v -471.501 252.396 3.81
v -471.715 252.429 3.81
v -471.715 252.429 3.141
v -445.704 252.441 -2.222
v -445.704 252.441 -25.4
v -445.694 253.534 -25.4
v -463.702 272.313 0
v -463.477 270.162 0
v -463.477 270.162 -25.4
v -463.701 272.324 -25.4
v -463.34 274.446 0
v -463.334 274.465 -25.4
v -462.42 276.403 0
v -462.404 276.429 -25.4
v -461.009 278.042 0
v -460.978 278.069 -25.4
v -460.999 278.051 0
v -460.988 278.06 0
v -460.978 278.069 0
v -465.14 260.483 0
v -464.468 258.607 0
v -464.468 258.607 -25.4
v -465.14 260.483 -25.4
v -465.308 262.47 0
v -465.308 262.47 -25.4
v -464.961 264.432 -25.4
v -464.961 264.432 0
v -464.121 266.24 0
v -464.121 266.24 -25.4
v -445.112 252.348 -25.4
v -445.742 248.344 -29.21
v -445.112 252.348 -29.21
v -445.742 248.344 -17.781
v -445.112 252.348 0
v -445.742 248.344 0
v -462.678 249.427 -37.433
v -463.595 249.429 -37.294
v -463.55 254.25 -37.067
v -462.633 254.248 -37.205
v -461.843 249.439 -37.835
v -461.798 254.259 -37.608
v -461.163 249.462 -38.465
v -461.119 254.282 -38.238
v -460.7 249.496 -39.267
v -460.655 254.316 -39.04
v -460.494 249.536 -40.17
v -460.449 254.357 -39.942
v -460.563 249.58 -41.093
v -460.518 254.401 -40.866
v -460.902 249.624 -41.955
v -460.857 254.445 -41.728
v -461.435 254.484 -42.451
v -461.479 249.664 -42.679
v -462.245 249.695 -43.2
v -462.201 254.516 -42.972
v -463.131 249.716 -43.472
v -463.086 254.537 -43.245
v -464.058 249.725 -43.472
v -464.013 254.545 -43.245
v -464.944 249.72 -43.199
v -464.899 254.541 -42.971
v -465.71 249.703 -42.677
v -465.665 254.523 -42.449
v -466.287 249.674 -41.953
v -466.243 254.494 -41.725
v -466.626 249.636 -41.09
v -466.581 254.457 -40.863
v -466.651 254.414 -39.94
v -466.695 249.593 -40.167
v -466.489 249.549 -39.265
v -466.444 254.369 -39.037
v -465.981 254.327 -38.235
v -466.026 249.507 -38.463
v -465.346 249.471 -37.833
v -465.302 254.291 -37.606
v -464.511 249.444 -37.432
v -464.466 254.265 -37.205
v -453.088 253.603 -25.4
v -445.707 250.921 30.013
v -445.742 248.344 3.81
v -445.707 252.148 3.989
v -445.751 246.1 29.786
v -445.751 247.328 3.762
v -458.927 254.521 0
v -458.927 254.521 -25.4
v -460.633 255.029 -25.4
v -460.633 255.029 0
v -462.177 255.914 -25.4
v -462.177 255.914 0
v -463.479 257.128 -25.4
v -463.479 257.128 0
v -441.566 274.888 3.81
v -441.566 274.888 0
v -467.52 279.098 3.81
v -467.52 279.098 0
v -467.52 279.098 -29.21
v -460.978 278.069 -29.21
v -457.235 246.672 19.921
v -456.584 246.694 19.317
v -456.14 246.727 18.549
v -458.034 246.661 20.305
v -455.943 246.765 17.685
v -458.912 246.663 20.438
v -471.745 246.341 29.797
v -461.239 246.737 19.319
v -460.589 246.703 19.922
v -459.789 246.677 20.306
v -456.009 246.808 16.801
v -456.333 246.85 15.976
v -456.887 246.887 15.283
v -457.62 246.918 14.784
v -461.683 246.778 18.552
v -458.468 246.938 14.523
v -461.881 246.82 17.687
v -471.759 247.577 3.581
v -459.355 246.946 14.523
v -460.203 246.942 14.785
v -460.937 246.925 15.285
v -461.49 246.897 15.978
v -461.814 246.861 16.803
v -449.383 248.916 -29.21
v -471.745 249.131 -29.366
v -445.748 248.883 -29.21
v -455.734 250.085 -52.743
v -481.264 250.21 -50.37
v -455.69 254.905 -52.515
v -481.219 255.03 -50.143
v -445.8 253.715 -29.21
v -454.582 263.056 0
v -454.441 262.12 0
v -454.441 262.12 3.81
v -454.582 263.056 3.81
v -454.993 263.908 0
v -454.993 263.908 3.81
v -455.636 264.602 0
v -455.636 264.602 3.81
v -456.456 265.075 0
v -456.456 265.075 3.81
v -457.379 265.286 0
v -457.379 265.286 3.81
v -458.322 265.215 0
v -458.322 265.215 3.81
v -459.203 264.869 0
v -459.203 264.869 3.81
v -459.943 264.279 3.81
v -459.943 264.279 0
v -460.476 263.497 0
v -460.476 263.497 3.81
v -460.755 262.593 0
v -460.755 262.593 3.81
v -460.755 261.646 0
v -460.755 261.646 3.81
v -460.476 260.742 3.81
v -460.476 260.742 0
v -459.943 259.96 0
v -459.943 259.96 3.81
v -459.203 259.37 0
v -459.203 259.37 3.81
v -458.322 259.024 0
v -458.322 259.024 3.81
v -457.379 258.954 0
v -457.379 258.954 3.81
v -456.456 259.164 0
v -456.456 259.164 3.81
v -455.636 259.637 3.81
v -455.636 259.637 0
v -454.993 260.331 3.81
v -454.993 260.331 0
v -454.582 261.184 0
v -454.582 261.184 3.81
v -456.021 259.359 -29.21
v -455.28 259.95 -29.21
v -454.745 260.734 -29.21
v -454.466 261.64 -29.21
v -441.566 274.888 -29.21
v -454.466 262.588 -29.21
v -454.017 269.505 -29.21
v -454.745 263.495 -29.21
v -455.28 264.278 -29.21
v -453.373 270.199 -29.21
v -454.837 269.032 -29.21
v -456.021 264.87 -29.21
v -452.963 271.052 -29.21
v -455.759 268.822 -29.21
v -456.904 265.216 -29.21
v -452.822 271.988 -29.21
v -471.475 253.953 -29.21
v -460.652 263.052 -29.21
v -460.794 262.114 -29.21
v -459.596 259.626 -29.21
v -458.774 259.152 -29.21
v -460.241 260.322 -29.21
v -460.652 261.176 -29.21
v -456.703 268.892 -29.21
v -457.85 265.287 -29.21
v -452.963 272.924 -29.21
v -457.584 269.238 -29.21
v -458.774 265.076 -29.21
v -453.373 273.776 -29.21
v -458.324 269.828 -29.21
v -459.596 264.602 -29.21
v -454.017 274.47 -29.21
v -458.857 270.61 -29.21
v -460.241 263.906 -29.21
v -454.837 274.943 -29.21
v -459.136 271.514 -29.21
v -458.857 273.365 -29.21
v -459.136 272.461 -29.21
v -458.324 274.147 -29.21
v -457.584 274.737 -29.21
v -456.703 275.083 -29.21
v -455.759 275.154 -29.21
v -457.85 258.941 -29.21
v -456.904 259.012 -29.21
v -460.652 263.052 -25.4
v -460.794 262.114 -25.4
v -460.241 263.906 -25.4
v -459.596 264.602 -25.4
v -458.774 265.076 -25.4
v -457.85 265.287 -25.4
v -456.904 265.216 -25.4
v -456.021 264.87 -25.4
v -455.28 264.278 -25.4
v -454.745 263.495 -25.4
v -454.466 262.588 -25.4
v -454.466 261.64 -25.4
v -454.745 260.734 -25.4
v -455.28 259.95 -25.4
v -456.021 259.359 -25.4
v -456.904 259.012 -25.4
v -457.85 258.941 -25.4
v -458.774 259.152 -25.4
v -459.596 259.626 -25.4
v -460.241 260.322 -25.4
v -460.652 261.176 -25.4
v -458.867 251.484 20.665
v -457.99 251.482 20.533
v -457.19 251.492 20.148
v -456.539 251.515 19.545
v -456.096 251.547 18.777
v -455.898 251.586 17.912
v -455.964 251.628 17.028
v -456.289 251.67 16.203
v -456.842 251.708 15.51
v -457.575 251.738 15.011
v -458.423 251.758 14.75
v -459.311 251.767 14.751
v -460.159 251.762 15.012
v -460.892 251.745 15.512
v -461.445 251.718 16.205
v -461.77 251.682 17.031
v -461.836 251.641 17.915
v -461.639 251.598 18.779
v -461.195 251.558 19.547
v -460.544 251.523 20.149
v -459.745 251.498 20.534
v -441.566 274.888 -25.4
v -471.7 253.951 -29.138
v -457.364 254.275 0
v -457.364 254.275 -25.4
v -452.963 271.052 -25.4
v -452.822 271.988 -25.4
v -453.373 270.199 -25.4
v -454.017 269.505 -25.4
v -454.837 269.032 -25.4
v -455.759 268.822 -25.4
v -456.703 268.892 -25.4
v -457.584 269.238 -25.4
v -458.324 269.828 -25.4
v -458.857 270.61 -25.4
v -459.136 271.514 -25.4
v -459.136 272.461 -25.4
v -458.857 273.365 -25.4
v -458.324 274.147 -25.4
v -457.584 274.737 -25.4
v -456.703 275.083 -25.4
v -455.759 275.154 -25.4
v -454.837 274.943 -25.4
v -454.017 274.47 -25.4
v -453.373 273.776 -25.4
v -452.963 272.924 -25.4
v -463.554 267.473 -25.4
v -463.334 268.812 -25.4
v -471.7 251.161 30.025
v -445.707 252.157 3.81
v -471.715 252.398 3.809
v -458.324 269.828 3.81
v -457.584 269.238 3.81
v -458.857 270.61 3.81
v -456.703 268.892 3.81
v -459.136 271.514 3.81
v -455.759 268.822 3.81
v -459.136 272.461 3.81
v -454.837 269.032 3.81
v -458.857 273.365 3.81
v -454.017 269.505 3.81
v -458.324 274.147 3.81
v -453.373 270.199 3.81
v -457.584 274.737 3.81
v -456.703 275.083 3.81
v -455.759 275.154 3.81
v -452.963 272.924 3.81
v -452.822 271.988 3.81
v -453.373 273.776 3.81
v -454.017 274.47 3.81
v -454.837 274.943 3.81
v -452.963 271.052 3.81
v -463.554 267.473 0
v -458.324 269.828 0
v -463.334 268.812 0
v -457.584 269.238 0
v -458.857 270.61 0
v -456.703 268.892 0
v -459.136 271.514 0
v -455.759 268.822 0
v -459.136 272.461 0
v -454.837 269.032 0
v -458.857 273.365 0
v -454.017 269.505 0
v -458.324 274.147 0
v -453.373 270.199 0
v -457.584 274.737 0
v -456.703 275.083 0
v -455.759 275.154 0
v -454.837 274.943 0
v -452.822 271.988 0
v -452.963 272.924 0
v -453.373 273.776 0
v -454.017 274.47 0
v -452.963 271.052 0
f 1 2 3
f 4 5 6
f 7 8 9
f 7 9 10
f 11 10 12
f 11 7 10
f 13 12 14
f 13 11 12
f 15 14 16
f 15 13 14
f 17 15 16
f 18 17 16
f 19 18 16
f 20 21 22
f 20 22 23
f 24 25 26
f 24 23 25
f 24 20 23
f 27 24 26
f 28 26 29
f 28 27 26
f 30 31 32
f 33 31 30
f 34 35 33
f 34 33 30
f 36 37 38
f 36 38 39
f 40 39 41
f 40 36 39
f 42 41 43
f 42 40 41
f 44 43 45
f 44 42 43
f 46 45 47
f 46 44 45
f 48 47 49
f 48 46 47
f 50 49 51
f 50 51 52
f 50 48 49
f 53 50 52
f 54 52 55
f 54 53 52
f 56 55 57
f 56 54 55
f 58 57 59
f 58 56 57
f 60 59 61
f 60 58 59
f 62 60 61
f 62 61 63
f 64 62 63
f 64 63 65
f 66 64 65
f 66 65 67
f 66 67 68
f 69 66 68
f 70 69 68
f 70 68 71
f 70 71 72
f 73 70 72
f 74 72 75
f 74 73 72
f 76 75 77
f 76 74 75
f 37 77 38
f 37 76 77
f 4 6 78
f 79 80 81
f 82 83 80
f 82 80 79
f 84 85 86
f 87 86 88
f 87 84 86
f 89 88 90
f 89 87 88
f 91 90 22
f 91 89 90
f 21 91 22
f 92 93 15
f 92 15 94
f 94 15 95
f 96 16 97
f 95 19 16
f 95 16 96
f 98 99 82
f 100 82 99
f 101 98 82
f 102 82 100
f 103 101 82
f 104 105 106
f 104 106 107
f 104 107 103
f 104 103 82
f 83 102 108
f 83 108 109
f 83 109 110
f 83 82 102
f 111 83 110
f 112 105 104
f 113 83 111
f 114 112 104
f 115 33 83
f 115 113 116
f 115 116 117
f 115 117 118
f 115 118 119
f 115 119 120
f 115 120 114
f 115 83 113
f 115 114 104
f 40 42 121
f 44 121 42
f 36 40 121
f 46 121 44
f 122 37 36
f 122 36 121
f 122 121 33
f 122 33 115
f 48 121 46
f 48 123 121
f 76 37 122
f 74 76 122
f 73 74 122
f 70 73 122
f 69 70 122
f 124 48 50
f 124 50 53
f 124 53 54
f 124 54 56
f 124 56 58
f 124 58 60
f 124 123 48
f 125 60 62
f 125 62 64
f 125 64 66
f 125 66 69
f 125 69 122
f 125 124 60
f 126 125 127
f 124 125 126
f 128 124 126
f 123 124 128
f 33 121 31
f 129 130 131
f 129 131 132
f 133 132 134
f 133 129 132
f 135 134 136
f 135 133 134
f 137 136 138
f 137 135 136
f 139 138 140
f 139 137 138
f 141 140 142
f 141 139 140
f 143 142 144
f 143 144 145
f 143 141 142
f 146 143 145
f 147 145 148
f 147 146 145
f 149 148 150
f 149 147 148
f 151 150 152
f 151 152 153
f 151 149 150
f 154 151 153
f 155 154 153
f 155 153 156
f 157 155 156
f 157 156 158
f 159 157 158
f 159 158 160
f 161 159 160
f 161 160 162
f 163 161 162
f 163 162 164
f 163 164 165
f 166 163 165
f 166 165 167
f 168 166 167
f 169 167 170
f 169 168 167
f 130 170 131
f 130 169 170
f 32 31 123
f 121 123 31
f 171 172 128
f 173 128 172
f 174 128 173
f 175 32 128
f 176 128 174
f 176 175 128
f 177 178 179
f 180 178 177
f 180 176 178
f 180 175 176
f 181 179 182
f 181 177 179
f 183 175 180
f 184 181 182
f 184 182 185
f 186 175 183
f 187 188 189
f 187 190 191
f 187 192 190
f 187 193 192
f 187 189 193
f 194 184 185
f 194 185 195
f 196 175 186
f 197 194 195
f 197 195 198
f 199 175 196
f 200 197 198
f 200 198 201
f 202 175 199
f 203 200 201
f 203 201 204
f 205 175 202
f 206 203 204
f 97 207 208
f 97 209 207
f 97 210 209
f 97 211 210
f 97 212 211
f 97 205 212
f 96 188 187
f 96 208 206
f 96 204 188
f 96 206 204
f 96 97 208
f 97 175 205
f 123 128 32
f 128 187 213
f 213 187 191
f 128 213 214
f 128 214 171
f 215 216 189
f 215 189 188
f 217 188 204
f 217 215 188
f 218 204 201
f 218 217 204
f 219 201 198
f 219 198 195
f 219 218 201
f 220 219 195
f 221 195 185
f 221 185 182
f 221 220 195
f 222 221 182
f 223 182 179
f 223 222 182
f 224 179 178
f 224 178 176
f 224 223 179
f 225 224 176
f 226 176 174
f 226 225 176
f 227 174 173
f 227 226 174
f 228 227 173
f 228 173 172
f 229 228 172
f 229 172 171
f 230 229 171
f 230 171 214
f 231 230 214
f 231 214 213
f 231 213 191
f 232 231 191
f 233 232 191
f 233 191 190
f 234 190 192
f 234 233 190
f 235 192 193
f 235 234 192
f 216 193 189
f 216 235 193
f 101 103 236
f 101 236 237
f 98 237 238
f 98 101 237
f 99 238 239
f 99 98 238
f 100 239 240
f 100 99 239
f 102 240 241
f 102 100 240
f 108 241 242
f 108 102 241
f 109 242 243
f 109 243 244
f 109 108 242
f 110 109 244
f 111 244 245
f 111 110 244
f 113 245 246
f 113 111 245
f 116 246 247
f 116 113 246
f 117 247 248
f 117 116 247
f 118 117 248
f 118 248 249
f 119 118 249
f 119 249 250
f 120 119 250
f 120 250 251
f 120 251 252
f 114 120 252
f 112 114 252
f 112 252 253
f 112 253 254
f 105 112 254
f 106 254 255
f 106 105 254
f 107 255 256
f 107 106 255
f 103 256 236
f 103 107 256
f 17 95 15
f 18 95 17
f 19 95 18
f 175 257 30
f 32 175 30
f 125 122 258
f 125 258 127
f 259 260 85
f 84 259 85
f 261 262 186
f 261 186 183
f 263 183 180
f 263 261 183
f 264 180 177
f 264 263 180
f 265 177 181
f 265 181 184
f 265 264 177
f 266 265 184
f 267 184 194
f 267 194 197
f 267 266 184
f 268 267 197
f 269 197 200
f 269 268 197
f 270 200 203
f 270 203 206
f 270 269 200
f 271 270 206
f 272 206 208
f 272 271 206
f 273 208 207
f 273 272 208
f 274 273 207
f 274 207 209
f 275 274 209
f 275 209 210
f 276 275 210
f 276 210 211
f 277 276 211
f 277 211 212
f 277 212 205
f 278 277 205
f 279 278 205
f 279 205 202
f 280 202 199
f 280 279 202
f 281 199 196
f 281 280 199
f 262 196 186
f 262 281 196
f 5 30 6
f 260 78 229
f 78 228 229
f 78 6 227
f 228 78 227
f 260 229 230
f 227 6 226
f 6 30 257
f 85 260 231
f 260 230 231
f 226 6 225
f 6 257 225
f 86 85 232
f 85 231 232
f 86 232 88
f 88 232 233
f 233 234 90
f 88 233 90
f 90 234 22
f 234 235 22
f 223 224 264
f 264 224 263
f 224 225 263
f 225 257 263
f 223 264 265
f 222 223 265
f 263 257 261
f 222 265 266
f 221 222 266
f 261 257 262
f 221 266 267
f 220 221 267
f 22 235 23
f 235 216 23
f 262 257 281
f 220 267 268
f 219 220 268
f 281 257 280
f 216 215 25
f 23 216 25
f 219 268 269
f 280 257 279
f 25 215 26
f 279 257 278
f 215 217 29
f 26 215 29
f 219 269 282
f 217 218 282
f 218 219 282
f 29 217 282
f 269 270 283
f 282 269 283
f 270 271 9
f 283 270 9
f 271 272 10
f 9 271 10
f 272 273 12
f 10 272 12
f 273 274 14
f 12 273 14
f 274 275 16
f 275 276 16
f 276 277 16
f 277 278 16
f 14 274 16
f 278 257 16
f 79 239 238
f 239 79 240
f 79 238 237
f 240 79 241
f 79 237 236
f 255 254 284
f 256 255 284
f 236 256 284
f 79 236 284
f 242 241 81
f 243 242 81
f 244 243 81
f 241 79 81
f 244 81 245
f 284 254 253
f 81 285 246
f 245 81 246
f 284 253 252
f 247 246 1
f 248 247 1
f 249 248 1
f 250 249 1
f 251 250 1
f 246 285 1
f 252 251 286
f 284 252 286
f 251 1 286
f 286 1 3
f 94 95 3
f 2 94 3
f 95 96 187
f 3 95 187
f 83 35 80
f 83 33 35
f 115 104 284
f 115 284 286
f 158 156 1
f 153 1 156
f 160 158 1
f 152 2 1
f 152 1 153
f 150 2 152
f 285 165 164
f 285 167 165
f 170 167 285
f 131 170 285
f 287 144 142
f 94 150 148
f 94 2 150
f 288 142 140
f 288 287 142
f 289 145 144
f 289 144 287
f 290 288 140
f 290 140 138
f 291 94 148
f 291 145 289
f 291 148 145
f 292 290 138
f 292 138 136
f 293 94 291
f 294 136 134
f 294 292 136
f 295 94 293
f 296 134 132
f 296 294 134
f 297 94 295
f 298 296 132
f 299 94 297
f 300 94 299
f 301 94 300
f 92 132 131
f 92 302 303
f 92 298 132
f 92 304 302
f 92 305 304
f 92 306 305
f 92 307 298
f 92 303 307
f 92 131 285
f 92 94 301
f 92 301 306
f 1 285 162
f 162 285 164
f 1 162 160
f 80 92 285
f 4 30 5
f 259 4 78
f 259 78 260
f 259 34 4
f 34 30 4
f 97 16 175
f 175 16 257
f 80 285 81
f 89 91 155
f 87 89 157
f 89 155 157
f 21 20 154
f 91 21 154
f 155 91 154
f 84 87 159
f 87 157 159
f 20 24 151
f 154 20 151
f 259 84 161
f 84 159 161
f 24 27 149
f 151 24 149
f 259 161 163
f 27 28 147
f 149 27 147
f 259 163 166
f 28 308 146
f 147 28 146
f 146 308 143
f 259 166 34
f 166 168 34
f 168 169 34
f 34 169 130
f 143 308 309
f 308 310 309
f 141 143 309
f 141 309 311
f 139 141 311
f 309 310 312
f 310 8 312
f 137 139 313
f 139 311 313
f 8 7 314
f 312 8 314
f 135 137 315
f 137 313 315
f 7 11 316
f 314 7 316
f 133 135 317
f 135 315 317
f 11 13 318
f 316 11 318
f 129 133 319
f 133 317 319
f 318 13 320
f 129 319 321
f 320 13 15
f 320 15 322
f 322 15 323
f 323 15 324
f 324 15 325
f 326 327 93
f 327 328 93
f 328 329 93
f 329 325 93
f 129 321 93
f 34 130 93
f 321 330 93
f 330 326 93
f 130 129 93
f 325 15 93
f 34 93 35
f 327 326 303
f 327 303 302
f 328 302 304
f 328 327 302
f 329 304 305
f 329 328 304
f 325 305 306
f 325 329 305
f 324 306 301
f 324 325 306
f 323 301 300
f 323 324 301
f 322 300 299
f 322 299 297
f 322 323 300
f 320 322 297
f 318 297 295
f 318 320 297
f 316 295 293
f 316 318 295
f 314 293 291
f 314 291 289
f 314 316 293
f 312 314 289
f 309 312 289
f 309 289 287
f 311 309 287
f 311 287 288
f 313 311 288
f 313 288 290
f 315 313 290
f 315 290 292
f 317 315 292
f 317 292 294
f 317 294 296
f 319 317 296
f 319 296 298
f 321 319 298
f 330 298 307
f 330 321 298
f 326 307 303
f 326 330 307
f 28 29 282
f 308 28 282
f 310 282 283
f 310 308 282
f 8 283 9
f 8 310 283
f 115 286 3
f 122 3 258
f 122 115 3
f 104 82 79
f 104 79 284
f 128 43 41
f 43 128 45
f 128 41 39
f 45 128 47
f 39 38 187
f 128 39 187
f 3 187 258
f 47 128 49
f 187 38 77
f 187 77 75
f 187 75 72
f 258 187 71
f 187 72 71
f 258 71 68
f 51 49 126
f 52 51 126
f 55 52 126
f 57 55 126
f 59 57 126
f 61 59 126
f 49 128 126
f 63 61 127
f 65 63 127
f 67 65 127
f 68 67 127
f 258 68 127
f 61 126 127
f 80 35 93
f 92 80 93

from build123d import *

# Parameters (mm, degrees)
BOSS_EXTRUDE1_DEPTH      = 29.21
SKETCH2_R                = 3.175
BOSS_EXTRUDE2_DEPTH      = 3.81
BOSS_EXTRUDE3_START      = -3.81
SKETCH3_R                = 3.175
SKETCH3_R_2              = 3.181823626
BOSS_EXTRUDE3_DEPTH      = 3.81
BOSS_EXTRUDE4_DEPTH      = 1.524
BOSS_EXTRUDE4_DEPTH_BACK = 3.302
SKETCH4_R                = 3.109705259
SKETCH4_R_2              = 2.977374329


with BuildPart() as part:
    # Sketch1 → Boss-Extrude1 (new body)
    with BuildSketch(Plane.XY):
        with BuildLine():
            Line((-445.741932109, 248.343634647), (-445.112071681, 252.347923806))
            Line((-445.112071681, 252.347923806), (-457.363663126, 254.275055523))
            Line((-457.363663126, 254.275055523), (-458.927145779, 254.520985778))
            ThreePointArc((-458.927145779, 254.520985778), (-462.17729329, 255.913510824), (-464.467858916, 258.607187485))
            ThreePointArc((-464.467858916, 258.607187485), (-465.308453245, 262.469514201), (-464.120754615, 266.239598875))
            ThreePointArc((-464.120754615, 266.239598875), (-463.399050509, 268.135245999), (-463.477224231, 270.162121354))
            ThreePointArc((-463.477224231, 270.162121354), (-463.334265537, 274.465295187), (-460.978145391, 278.068965549))
            Line((-460.978145391, 278.068965549), (-467.519631336, 279.097918))
            Line((-467.519631336, 279.097918), (-471.71455165, 252.429035234))
            Line((-471.71455165, 252.429035234), (-445.741932109, 248.343634647))
        make_face()
    extrude(amount=-BOSS_EXTRUDE1_DEPTH)

    # Sketch2 → Boss-Extrude2 (add)
    with BuildSketch(Plane.XY):
        Polygon((-467.519631336, 279.097918), (-471.71455165, 252.429035234), (-445.741932109, 248.343634647), (-441.565787186, 274.887665754), align=None)
        with Locations((-455.996603091, 271.987703521)):
            Circle(SKETCH2_R, mode=Mode.SUBTRACT)
        with Locations((-457.615851502, 262.119672583)):
            Circle(SKETCH2_R, mode=Mode.SUBTRACT)
    extrude(amount=BOSS_EXTRUDE2_DEPTH)

    # Sketch3 → Boss-Extrude3 (add)
    with BuildSketch(Plane(origin=(0, 0, -29.21), x_dir=(-1, 0, 0), z_dir=(0, 0, -1)).offset(BOSS_EXTRUDE3_START)):
        with BuildLine():
            Line((460.978145391, 278.068965549), (441.565787186, 274.887665754))
            Line((441.565787186, 274.887665754), (445.112071681, 252.347923806))
            Line((445.112071681, 252.347923806), (458.927145779, 254.520985778))
            ThreePointArc((458.927145779, 254.520985778), (464.657191184, 258.991661442), (464.120754615, 266.239598875))
            ThreePointArc((464.120754615, 266.239598875), (463.399050509, 268.135245999), (463.477224231, 270.162121354))
            ThreePointArc((463.477224231, 270.162121354), (463.334265537, 274.465295187), (460.978145391, 278.068965549))
        make_face()
        with Locations(Location((455.996603091, 271.987703521, 0), (0, 0, 180))):
            Circle(SKETCH3_R, mode=Mode.SUBTRACT)
        with Locations((457.611982645, 262.114049476)):
            Circle(SKETCH3_R_2, mode=Mode.SUBTRACT)
    extrude(amount=BOSS_EXTRUDE3_DEPTH)

    # Sketch4 → Boss-Extrude4 (add, two sides: drawn at the far end of the back side and taken through both)
    with BuildSketch(Plane(origin=(2.279673246, 246.113529363, 11.60731603), x_dir=(0.9999571992457364, -0.009241736857419818, -0.0004358629151659602), z_dir=(0.009252009328930062, 0.998846950490518, 0.04710806533037038)).offset(-BOSS_EXTRUDE4_DEPTH_BACK)):
        Polygon((-448.019641178, 7.893719141), (-448.019641178, -18.159221947), (-474.014513074, -18.159221947), (-474.028905268, 8.086182696), (-474.014513074, 41.069520713), (-483.533549488, 62.101622956), (-458.002958068, 64.465529415), (-448.005248984, 40.877057158), align=None)
        with Locations(Location((-465.863593213, 52.113287489, 0), (0, 0, 270))):
            Circle(SKETCH4_R, mode=Mode.SUBTRACT)
        with Locations(Location((-461.180575409, -5.817624253, 0), (0, 0, 270))):
            Circle(SKETCH4_R_2, mode=Mode.SUBTRACT)
    extrude(amount=BOSS_EXTRUDE4_DEPTH + BOSS_EXTRUDE4_DEPTH_BACK)


solid = part.part
